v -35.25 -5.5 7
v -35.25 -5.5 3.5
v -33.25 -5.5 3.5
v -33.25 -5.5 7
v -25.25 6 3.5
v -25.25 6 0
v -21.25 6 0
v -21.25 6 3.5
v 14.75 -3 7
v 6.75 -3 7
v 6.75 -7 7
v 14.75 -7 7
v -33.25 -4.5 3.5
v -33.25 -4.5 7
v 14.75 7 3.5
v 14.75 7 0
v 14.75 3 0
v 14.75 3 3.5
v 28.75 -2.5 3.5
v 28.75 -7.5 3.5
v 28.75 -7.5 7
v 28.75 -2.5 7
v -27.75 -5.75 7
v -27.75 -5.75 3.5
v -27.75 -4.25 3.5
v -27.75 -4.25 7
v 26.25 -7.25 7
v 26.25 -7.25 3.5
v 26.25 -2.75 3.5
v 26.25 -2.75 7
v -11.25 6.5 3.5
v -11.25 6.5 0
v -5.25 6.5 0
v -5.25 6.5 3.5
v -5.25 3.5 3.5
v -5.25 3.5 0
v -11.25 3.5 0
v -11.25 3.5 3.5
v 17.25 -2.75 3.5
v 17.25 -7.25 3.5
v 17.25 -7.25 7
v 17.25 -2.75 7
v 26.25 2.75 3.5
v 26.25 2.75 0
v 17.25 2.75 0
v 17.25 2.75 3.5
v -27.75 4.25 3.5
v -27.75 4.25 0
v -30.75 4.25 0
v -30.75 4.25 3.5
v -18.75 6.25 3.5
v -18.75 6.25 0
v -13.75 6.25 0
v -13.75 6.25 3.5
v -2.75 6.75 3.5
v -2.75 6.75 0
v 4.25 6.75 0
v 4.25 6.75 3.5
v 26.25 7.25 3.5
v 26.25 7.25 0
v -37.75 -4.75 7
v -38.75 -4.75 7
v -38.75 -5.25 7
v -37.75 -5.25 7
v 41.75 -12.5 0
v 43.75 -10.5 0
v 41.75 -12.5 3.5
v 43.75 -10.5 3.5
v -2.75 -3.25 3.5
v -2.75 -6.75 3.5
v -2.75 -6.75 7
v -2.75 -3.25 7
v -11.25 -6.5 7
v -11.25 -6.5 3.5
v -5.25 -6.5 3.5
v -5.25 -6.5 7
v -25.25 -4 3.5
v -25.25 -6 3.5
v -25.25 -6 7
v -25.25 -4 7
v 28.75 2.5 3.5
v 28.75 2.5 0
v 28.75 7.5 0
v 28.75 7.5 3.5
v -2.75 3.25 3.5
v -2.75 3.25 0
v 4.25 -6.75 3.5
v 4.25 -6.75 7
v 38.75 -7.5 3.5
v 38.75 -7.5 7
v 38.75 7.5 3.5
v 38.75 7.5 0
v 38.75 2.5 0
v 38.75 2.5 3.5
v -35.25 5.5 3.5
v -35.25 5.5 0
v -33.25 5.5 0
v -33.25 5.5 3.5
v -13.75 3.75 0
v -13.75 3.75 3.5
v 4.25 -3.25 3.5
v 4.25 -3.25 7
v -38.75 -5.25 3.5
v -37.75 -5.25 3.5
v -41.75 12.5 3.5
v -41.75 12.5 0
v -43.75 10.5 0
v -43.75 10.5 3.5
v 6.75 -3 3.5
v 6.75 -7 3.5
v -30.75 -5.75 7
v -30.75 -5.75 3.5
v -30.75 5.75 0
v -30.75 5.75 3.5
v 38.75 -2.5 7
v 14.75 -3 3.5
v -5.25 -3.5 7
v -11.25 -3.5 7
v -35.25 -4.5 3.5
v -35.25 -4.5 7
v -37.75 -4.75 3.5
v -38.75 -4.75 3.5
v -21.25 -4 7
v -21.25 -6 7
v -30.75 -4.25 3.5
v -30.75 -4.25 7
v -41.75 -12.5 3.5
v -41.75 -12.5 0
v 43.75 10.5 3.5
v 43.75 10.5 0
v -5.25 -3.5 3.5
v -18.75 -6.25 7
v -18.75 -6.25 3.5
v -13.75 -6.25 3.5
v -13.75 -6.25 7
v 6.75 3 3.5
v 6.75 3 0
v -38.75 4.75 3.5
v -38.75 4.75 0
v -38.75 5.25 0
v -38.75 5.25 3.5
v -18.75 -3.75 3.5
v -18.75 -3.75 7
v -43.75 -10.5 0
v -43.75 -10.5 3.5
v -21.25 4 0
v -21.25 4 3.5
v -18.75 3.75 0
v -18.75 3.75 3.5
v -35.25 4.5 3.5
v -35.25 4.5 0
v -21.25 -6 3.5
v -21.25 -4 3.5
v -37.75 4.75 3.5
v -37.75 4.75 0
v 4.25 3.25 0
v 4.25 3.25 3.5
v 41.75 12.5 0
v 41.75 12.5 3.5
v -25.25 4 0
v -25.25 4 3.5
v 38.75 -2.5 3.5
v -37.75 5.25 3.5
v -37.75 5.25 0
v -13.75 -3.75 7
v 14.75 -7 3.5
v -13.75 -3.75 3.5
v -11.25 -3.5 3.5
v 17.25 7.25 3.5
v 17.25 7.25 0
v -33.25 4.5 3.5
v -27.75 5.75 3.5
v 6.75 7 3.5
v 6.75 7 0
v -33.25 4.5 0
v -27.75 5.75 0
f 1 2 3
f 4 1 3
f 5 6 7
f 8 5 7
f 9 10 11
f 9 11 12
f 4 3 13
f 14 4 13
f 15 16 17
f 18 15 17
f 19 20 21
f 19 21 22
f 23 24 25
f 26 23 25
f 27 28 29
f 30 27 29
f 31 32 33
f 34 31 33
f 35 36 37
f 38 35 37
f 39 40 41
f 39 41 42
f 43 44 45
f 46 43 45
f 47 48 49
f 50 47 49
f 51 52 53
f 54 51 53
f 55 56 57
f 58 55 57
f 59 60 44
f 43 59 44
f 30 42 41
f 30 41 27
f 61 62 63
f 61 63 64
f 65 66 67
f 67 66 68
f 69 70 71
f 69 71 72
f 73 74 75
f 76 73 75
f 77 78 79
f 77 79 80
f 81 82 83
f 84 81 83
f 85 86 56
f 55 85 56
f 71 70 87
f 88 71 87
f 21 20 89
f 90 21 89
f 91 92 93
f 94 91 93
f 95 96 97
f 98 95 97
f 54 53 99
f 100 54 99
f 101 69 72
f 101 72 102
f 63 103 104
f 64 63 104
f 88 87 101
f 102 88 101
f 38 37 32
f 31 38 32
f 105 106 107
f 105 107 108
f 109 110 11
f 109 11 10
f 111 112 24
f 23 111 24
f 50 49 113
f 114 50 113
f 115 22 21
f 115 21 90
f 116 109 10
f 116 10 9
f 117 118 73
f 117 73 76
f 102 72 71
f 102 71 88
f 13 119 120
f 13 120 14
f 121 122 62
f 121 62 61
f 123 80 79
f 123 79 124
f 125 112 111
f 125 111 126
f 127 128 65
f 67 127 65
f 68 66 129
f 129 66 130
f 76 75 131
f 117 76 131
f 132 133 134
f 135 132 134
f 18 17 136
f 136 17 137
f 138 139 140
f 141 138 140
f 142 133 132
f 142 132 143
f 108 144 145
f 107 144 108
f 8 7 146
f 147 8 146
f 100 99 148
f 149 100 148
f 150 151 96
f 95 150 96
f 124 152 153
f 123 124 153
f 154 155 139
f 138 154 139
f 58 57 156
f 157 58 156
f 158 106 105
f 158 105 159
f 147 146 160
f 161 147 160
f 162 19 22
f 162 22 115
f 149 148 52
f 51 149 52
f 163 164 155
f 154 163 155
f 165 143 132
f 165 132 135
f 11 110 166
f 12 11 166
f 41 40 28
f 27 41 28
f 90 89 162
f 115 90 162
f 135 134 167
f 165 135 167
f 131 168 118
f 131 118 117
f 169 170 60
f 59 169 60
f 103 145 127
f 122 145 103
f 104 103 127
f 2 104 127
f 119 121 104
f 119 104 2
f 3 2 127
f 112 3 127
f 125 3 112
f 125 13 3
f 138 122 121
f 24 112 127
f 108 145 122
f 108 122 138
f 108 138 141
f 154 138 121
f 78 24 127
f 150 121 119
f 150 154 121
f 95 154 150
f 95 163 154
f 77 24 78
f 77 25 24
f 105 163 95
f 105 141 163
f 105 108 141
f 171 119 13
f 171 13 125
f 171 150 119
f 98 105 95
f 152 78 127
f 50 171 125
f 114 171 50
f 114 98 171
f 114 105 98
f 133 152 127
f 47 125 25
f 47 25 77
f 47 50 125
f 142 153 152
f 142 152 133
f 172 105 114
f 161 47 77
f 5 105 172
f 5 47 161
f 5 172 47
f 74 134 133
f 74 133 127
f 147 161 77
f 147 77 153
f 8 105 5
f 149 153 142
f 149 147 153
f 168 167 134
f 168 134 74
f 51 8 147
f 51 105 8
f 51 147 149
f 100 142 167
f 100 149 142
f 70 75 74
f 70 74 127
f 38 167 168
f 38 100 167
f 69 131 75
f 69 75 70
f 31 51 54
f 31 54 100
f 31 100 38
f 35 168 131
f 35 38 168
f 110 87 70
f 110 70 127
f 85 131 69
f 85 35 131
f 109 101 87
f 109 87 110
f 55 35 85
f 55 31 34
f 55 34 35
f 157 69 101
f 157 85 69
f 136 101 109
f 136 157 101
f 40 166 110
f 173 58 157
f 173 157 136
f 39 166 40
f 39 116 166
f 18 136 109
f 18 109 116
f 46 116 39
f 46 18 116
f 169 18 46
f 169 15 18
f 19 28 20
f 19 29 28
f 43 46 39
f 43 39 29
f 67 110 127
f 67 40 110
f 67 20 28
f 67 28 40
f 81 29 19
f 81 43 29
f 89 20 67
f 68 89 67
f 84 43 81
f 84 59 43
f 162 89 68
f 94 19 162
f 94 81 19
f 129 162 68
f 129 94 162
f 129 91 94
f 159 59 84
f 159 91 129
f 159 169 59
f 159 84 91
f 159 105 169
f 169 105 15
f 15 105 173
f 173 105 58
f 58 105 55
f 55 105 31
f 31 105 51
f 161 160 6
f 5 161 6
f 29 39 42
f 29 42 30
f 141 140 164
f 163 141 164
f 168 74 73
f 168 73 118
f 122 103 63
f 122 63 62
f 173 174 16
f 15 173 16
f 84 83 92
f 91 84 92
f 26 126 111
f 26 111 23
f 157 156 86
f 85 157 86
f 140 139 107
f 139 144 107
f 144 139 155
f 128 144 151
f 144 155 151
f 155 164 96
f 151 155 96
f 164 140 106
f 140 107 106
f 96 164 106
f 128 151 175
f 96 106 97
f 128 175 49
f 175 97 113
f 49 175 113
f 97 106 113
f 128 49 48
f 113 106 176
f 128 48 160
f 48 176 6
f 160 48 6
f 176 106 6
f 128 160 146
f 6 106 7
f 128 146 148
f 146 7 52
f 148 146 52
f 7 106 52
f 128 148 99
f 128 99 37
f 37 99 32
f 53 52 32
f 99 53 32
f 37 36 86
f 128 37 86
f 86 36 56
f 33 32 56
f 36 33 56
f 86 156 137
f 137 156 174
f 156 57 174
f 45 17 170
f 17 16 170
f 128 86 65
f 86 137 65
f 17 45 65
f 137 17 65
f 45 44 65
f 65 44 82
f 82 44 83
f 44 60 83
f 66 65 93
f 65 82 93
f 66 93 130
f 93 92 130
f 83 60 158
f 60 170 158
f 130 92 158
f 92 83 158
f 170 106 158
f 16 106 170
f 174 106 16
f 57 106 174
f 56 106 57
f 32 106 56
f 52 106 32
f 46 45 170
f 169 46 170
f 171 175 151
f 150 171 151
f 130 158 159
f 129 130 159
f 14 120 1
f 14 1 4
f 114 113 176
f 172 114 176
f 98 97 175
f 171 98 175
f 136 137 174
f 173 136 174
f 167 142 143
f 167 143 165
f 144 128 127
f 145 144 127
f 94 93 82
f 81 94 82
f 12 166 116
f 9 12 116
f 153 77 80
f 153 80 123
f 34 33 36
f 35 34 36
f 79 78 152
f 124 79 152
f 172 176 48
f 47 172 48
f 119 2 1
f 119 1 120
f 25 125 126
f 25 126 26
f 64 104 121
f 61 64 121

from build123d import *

# Parameters (mm, degrees)
F0_W     = 87.5
F0_H     = 25
F0_W_2   = 1
F0_H_2   = 0.5
F0_W_3   = 2
F0_H_3   = 1
F0_W_4   = 3
F0_H_4   = 1.5
F0_W_5   = 4
F0_H_5   = 2
F0_W_6   = 5
F0_H_6   = 2.5
F0_W_7   = 6
F0_H_7   = 3
F0_W_8   = 7
F0_H_8   = 3.5
F0_W_9   = 8
F0_H_9   = 4
F0_W_10  = 9
F0_H_10  = 4.5
F0_W_11  = 10
F0_H_11  = 5
F1_DEPTH = 3.5
F2_DEPTH = 7
F3_SIZE  = 2


with BuildPart() as f1:
    # F0 (on Top) → F1 (new body)
    with BuildSketch(Plane.XY):
        Rectangle(F0_W, F0_H)
        with Locations((-38.25, -5)):
            Rectangle(F0_W_2, F0_H_2, mode=Mode.SUBTRACT)
        with Locations((-34.25, -5)):
            Rectangle(F0_W_3, F0_H_3, mode=Mode.SUBTRACT)
        with Locations((-29.25, -5)):
            Rectangle(F0_W_4, F0_H_4, mode=Mode.SUBTRACT)
        with Locations((-23.25, -5)):
            Rectangle(F0_W_5, F0_H_5, mode=Mode.SUBTRACT)
        with Locations((-16.25, -5)):
            Rectangle(F0_W_6, F0_H_6, mode=Mode.SUBTRACT)
        with Locations((-8.25, -5)):
            Rectangle(F0_W_7, F0_H_7, mode=Mode.SUBTRACT)
        with Locations((0.75, -5)):
            Rectangle(F0_W_8, F0_H_8, mode=Mode.SUBTRACT)
        with Locations((10.75, -5)):
            Rectangle(F0_W_9, F0_H_9, mode=Mode.SUBTRACT)
        with Locations((21.75, -5)):
            Rectangle(F0_W_10, F0_H_10, mode=Mode.SUBTRACT)
        with Locations((33.75, -5)):
            Rectangle(F0_W_11, F0_H_11, mode=Mode.SUBTRACT)
        Polygon((-38.25, 5.25), (-37.75, 5.25), (-37.75, 4.75), (-38.75, 4.75), (-38.75, 5.25), align=None, mode=Mode.SUBTRACT)
        Polygon((-34.25, 5.5), (-33.25, 5.5), (-33.25, 4.5), (-35.25, 4.5), (-35.25, 5.5), align=None, mode=Mode.SUBTRACT)
        Polygon((-30.75, 4.25), (-30.75, 5.75), (-29.25, 5.75), (-27.75, 5.75), (-27.75, 4.25), align=None, mode=Mode.SUBTRACT)
        Polygon((-25.25, 4), (-25.25, 6), (-23.25, 6), (-21.25, 6), (-21.25, 4), align=None, mode=Mode.SUBTRACT)
        Polygon((-18.75, 3.75), (-18.75, 6.25), (-16.25, 6.25), (-13.75, 6.25), (-13.75, 3.75), align=None, mode=Mode.SUBTRACT)
        Polygon((-11.25, 3.5), (-11.25, 6.5), (-8.25, 6.5), (-5.25, 6.5), (-5.25, 3.5), align=None, mode=Mode.SUBTRACT)
        Polygon((-2.75, 3.25), (-2.75, 6.75), (0.75, 6.75), (4.25, 6.75), (4.25, 3.25), align=None, mode=Mode.SUBTRACT)
        Polygon((6.75, 3), (6.75, 7), (10.75, 7), (14.75, 7), (14.75, 3), align=None, mode=Mode.SUBTRACT)
        Polygon((17.25, 2.75), (17.25, 7.25), (21.75, 7.25), (26.25, 7.25), (26.25, 2.75), align=None, mode=Mode.SUBTRACT)
        Polygon((28.75, 2.5), (28.75, 7.5), (33.75, 7.5), (38.75, 7.5), (38.75, 2.5), align=None, mode=Mode.SUBTRACT)
    extrude(amount=F1_DEPTH)

    # F0 (on Top) → F2 (join, through all)
    with BuildSketch(Plane.XY):
        with Locations((-38.25, -5)):
            Rectangle(F0_W_2, F0_H_2)
        with Locations((-34.25, -5)):
            Rectangle(F0_W_3, F0_H_3)
        with Locations((-29.25, -5)):
            Rectangle(F0_W_4, F0_H_4)
        with Locations((-23.25, -5)):
            Rectangle(F0_W_5, F0_H_5)
        with Locations((-16.25, -5)):
            Rectangle(F0_W_6, F0_H_6)
        with Locations((-8.25, -5)):
            Rectangle(F0_W_7, F0_H_7)
        with Locations((0.75, -5)):
            Rectangle(F0_W_8, F0_H_8)
        with Locations((10.75, -5)):
            Rectangle(F0_W_9, F0_H_9)
        with Locations((21.75, -5)):
            Rectangle(F0_W_10, F0_H_10)
        with Locations((33.75, -5)):
            Rectangle(F0_W_11, F0_H_11)
    extrude(amount=F2_DEPTH)

    # F3
    f3_edges = [f1.edges().sort_by_distance(p)[0] for p in [
        (-43.75, -12.5, 1.75),
        (43.75, -12.5, 1.75),
        (43.75, 12.5, 1.75),
        (-43.75, 12.5, 1.75),
    ]]
    chamfer(f3_edges, length=F3_SIZE)


solid = f1.part
